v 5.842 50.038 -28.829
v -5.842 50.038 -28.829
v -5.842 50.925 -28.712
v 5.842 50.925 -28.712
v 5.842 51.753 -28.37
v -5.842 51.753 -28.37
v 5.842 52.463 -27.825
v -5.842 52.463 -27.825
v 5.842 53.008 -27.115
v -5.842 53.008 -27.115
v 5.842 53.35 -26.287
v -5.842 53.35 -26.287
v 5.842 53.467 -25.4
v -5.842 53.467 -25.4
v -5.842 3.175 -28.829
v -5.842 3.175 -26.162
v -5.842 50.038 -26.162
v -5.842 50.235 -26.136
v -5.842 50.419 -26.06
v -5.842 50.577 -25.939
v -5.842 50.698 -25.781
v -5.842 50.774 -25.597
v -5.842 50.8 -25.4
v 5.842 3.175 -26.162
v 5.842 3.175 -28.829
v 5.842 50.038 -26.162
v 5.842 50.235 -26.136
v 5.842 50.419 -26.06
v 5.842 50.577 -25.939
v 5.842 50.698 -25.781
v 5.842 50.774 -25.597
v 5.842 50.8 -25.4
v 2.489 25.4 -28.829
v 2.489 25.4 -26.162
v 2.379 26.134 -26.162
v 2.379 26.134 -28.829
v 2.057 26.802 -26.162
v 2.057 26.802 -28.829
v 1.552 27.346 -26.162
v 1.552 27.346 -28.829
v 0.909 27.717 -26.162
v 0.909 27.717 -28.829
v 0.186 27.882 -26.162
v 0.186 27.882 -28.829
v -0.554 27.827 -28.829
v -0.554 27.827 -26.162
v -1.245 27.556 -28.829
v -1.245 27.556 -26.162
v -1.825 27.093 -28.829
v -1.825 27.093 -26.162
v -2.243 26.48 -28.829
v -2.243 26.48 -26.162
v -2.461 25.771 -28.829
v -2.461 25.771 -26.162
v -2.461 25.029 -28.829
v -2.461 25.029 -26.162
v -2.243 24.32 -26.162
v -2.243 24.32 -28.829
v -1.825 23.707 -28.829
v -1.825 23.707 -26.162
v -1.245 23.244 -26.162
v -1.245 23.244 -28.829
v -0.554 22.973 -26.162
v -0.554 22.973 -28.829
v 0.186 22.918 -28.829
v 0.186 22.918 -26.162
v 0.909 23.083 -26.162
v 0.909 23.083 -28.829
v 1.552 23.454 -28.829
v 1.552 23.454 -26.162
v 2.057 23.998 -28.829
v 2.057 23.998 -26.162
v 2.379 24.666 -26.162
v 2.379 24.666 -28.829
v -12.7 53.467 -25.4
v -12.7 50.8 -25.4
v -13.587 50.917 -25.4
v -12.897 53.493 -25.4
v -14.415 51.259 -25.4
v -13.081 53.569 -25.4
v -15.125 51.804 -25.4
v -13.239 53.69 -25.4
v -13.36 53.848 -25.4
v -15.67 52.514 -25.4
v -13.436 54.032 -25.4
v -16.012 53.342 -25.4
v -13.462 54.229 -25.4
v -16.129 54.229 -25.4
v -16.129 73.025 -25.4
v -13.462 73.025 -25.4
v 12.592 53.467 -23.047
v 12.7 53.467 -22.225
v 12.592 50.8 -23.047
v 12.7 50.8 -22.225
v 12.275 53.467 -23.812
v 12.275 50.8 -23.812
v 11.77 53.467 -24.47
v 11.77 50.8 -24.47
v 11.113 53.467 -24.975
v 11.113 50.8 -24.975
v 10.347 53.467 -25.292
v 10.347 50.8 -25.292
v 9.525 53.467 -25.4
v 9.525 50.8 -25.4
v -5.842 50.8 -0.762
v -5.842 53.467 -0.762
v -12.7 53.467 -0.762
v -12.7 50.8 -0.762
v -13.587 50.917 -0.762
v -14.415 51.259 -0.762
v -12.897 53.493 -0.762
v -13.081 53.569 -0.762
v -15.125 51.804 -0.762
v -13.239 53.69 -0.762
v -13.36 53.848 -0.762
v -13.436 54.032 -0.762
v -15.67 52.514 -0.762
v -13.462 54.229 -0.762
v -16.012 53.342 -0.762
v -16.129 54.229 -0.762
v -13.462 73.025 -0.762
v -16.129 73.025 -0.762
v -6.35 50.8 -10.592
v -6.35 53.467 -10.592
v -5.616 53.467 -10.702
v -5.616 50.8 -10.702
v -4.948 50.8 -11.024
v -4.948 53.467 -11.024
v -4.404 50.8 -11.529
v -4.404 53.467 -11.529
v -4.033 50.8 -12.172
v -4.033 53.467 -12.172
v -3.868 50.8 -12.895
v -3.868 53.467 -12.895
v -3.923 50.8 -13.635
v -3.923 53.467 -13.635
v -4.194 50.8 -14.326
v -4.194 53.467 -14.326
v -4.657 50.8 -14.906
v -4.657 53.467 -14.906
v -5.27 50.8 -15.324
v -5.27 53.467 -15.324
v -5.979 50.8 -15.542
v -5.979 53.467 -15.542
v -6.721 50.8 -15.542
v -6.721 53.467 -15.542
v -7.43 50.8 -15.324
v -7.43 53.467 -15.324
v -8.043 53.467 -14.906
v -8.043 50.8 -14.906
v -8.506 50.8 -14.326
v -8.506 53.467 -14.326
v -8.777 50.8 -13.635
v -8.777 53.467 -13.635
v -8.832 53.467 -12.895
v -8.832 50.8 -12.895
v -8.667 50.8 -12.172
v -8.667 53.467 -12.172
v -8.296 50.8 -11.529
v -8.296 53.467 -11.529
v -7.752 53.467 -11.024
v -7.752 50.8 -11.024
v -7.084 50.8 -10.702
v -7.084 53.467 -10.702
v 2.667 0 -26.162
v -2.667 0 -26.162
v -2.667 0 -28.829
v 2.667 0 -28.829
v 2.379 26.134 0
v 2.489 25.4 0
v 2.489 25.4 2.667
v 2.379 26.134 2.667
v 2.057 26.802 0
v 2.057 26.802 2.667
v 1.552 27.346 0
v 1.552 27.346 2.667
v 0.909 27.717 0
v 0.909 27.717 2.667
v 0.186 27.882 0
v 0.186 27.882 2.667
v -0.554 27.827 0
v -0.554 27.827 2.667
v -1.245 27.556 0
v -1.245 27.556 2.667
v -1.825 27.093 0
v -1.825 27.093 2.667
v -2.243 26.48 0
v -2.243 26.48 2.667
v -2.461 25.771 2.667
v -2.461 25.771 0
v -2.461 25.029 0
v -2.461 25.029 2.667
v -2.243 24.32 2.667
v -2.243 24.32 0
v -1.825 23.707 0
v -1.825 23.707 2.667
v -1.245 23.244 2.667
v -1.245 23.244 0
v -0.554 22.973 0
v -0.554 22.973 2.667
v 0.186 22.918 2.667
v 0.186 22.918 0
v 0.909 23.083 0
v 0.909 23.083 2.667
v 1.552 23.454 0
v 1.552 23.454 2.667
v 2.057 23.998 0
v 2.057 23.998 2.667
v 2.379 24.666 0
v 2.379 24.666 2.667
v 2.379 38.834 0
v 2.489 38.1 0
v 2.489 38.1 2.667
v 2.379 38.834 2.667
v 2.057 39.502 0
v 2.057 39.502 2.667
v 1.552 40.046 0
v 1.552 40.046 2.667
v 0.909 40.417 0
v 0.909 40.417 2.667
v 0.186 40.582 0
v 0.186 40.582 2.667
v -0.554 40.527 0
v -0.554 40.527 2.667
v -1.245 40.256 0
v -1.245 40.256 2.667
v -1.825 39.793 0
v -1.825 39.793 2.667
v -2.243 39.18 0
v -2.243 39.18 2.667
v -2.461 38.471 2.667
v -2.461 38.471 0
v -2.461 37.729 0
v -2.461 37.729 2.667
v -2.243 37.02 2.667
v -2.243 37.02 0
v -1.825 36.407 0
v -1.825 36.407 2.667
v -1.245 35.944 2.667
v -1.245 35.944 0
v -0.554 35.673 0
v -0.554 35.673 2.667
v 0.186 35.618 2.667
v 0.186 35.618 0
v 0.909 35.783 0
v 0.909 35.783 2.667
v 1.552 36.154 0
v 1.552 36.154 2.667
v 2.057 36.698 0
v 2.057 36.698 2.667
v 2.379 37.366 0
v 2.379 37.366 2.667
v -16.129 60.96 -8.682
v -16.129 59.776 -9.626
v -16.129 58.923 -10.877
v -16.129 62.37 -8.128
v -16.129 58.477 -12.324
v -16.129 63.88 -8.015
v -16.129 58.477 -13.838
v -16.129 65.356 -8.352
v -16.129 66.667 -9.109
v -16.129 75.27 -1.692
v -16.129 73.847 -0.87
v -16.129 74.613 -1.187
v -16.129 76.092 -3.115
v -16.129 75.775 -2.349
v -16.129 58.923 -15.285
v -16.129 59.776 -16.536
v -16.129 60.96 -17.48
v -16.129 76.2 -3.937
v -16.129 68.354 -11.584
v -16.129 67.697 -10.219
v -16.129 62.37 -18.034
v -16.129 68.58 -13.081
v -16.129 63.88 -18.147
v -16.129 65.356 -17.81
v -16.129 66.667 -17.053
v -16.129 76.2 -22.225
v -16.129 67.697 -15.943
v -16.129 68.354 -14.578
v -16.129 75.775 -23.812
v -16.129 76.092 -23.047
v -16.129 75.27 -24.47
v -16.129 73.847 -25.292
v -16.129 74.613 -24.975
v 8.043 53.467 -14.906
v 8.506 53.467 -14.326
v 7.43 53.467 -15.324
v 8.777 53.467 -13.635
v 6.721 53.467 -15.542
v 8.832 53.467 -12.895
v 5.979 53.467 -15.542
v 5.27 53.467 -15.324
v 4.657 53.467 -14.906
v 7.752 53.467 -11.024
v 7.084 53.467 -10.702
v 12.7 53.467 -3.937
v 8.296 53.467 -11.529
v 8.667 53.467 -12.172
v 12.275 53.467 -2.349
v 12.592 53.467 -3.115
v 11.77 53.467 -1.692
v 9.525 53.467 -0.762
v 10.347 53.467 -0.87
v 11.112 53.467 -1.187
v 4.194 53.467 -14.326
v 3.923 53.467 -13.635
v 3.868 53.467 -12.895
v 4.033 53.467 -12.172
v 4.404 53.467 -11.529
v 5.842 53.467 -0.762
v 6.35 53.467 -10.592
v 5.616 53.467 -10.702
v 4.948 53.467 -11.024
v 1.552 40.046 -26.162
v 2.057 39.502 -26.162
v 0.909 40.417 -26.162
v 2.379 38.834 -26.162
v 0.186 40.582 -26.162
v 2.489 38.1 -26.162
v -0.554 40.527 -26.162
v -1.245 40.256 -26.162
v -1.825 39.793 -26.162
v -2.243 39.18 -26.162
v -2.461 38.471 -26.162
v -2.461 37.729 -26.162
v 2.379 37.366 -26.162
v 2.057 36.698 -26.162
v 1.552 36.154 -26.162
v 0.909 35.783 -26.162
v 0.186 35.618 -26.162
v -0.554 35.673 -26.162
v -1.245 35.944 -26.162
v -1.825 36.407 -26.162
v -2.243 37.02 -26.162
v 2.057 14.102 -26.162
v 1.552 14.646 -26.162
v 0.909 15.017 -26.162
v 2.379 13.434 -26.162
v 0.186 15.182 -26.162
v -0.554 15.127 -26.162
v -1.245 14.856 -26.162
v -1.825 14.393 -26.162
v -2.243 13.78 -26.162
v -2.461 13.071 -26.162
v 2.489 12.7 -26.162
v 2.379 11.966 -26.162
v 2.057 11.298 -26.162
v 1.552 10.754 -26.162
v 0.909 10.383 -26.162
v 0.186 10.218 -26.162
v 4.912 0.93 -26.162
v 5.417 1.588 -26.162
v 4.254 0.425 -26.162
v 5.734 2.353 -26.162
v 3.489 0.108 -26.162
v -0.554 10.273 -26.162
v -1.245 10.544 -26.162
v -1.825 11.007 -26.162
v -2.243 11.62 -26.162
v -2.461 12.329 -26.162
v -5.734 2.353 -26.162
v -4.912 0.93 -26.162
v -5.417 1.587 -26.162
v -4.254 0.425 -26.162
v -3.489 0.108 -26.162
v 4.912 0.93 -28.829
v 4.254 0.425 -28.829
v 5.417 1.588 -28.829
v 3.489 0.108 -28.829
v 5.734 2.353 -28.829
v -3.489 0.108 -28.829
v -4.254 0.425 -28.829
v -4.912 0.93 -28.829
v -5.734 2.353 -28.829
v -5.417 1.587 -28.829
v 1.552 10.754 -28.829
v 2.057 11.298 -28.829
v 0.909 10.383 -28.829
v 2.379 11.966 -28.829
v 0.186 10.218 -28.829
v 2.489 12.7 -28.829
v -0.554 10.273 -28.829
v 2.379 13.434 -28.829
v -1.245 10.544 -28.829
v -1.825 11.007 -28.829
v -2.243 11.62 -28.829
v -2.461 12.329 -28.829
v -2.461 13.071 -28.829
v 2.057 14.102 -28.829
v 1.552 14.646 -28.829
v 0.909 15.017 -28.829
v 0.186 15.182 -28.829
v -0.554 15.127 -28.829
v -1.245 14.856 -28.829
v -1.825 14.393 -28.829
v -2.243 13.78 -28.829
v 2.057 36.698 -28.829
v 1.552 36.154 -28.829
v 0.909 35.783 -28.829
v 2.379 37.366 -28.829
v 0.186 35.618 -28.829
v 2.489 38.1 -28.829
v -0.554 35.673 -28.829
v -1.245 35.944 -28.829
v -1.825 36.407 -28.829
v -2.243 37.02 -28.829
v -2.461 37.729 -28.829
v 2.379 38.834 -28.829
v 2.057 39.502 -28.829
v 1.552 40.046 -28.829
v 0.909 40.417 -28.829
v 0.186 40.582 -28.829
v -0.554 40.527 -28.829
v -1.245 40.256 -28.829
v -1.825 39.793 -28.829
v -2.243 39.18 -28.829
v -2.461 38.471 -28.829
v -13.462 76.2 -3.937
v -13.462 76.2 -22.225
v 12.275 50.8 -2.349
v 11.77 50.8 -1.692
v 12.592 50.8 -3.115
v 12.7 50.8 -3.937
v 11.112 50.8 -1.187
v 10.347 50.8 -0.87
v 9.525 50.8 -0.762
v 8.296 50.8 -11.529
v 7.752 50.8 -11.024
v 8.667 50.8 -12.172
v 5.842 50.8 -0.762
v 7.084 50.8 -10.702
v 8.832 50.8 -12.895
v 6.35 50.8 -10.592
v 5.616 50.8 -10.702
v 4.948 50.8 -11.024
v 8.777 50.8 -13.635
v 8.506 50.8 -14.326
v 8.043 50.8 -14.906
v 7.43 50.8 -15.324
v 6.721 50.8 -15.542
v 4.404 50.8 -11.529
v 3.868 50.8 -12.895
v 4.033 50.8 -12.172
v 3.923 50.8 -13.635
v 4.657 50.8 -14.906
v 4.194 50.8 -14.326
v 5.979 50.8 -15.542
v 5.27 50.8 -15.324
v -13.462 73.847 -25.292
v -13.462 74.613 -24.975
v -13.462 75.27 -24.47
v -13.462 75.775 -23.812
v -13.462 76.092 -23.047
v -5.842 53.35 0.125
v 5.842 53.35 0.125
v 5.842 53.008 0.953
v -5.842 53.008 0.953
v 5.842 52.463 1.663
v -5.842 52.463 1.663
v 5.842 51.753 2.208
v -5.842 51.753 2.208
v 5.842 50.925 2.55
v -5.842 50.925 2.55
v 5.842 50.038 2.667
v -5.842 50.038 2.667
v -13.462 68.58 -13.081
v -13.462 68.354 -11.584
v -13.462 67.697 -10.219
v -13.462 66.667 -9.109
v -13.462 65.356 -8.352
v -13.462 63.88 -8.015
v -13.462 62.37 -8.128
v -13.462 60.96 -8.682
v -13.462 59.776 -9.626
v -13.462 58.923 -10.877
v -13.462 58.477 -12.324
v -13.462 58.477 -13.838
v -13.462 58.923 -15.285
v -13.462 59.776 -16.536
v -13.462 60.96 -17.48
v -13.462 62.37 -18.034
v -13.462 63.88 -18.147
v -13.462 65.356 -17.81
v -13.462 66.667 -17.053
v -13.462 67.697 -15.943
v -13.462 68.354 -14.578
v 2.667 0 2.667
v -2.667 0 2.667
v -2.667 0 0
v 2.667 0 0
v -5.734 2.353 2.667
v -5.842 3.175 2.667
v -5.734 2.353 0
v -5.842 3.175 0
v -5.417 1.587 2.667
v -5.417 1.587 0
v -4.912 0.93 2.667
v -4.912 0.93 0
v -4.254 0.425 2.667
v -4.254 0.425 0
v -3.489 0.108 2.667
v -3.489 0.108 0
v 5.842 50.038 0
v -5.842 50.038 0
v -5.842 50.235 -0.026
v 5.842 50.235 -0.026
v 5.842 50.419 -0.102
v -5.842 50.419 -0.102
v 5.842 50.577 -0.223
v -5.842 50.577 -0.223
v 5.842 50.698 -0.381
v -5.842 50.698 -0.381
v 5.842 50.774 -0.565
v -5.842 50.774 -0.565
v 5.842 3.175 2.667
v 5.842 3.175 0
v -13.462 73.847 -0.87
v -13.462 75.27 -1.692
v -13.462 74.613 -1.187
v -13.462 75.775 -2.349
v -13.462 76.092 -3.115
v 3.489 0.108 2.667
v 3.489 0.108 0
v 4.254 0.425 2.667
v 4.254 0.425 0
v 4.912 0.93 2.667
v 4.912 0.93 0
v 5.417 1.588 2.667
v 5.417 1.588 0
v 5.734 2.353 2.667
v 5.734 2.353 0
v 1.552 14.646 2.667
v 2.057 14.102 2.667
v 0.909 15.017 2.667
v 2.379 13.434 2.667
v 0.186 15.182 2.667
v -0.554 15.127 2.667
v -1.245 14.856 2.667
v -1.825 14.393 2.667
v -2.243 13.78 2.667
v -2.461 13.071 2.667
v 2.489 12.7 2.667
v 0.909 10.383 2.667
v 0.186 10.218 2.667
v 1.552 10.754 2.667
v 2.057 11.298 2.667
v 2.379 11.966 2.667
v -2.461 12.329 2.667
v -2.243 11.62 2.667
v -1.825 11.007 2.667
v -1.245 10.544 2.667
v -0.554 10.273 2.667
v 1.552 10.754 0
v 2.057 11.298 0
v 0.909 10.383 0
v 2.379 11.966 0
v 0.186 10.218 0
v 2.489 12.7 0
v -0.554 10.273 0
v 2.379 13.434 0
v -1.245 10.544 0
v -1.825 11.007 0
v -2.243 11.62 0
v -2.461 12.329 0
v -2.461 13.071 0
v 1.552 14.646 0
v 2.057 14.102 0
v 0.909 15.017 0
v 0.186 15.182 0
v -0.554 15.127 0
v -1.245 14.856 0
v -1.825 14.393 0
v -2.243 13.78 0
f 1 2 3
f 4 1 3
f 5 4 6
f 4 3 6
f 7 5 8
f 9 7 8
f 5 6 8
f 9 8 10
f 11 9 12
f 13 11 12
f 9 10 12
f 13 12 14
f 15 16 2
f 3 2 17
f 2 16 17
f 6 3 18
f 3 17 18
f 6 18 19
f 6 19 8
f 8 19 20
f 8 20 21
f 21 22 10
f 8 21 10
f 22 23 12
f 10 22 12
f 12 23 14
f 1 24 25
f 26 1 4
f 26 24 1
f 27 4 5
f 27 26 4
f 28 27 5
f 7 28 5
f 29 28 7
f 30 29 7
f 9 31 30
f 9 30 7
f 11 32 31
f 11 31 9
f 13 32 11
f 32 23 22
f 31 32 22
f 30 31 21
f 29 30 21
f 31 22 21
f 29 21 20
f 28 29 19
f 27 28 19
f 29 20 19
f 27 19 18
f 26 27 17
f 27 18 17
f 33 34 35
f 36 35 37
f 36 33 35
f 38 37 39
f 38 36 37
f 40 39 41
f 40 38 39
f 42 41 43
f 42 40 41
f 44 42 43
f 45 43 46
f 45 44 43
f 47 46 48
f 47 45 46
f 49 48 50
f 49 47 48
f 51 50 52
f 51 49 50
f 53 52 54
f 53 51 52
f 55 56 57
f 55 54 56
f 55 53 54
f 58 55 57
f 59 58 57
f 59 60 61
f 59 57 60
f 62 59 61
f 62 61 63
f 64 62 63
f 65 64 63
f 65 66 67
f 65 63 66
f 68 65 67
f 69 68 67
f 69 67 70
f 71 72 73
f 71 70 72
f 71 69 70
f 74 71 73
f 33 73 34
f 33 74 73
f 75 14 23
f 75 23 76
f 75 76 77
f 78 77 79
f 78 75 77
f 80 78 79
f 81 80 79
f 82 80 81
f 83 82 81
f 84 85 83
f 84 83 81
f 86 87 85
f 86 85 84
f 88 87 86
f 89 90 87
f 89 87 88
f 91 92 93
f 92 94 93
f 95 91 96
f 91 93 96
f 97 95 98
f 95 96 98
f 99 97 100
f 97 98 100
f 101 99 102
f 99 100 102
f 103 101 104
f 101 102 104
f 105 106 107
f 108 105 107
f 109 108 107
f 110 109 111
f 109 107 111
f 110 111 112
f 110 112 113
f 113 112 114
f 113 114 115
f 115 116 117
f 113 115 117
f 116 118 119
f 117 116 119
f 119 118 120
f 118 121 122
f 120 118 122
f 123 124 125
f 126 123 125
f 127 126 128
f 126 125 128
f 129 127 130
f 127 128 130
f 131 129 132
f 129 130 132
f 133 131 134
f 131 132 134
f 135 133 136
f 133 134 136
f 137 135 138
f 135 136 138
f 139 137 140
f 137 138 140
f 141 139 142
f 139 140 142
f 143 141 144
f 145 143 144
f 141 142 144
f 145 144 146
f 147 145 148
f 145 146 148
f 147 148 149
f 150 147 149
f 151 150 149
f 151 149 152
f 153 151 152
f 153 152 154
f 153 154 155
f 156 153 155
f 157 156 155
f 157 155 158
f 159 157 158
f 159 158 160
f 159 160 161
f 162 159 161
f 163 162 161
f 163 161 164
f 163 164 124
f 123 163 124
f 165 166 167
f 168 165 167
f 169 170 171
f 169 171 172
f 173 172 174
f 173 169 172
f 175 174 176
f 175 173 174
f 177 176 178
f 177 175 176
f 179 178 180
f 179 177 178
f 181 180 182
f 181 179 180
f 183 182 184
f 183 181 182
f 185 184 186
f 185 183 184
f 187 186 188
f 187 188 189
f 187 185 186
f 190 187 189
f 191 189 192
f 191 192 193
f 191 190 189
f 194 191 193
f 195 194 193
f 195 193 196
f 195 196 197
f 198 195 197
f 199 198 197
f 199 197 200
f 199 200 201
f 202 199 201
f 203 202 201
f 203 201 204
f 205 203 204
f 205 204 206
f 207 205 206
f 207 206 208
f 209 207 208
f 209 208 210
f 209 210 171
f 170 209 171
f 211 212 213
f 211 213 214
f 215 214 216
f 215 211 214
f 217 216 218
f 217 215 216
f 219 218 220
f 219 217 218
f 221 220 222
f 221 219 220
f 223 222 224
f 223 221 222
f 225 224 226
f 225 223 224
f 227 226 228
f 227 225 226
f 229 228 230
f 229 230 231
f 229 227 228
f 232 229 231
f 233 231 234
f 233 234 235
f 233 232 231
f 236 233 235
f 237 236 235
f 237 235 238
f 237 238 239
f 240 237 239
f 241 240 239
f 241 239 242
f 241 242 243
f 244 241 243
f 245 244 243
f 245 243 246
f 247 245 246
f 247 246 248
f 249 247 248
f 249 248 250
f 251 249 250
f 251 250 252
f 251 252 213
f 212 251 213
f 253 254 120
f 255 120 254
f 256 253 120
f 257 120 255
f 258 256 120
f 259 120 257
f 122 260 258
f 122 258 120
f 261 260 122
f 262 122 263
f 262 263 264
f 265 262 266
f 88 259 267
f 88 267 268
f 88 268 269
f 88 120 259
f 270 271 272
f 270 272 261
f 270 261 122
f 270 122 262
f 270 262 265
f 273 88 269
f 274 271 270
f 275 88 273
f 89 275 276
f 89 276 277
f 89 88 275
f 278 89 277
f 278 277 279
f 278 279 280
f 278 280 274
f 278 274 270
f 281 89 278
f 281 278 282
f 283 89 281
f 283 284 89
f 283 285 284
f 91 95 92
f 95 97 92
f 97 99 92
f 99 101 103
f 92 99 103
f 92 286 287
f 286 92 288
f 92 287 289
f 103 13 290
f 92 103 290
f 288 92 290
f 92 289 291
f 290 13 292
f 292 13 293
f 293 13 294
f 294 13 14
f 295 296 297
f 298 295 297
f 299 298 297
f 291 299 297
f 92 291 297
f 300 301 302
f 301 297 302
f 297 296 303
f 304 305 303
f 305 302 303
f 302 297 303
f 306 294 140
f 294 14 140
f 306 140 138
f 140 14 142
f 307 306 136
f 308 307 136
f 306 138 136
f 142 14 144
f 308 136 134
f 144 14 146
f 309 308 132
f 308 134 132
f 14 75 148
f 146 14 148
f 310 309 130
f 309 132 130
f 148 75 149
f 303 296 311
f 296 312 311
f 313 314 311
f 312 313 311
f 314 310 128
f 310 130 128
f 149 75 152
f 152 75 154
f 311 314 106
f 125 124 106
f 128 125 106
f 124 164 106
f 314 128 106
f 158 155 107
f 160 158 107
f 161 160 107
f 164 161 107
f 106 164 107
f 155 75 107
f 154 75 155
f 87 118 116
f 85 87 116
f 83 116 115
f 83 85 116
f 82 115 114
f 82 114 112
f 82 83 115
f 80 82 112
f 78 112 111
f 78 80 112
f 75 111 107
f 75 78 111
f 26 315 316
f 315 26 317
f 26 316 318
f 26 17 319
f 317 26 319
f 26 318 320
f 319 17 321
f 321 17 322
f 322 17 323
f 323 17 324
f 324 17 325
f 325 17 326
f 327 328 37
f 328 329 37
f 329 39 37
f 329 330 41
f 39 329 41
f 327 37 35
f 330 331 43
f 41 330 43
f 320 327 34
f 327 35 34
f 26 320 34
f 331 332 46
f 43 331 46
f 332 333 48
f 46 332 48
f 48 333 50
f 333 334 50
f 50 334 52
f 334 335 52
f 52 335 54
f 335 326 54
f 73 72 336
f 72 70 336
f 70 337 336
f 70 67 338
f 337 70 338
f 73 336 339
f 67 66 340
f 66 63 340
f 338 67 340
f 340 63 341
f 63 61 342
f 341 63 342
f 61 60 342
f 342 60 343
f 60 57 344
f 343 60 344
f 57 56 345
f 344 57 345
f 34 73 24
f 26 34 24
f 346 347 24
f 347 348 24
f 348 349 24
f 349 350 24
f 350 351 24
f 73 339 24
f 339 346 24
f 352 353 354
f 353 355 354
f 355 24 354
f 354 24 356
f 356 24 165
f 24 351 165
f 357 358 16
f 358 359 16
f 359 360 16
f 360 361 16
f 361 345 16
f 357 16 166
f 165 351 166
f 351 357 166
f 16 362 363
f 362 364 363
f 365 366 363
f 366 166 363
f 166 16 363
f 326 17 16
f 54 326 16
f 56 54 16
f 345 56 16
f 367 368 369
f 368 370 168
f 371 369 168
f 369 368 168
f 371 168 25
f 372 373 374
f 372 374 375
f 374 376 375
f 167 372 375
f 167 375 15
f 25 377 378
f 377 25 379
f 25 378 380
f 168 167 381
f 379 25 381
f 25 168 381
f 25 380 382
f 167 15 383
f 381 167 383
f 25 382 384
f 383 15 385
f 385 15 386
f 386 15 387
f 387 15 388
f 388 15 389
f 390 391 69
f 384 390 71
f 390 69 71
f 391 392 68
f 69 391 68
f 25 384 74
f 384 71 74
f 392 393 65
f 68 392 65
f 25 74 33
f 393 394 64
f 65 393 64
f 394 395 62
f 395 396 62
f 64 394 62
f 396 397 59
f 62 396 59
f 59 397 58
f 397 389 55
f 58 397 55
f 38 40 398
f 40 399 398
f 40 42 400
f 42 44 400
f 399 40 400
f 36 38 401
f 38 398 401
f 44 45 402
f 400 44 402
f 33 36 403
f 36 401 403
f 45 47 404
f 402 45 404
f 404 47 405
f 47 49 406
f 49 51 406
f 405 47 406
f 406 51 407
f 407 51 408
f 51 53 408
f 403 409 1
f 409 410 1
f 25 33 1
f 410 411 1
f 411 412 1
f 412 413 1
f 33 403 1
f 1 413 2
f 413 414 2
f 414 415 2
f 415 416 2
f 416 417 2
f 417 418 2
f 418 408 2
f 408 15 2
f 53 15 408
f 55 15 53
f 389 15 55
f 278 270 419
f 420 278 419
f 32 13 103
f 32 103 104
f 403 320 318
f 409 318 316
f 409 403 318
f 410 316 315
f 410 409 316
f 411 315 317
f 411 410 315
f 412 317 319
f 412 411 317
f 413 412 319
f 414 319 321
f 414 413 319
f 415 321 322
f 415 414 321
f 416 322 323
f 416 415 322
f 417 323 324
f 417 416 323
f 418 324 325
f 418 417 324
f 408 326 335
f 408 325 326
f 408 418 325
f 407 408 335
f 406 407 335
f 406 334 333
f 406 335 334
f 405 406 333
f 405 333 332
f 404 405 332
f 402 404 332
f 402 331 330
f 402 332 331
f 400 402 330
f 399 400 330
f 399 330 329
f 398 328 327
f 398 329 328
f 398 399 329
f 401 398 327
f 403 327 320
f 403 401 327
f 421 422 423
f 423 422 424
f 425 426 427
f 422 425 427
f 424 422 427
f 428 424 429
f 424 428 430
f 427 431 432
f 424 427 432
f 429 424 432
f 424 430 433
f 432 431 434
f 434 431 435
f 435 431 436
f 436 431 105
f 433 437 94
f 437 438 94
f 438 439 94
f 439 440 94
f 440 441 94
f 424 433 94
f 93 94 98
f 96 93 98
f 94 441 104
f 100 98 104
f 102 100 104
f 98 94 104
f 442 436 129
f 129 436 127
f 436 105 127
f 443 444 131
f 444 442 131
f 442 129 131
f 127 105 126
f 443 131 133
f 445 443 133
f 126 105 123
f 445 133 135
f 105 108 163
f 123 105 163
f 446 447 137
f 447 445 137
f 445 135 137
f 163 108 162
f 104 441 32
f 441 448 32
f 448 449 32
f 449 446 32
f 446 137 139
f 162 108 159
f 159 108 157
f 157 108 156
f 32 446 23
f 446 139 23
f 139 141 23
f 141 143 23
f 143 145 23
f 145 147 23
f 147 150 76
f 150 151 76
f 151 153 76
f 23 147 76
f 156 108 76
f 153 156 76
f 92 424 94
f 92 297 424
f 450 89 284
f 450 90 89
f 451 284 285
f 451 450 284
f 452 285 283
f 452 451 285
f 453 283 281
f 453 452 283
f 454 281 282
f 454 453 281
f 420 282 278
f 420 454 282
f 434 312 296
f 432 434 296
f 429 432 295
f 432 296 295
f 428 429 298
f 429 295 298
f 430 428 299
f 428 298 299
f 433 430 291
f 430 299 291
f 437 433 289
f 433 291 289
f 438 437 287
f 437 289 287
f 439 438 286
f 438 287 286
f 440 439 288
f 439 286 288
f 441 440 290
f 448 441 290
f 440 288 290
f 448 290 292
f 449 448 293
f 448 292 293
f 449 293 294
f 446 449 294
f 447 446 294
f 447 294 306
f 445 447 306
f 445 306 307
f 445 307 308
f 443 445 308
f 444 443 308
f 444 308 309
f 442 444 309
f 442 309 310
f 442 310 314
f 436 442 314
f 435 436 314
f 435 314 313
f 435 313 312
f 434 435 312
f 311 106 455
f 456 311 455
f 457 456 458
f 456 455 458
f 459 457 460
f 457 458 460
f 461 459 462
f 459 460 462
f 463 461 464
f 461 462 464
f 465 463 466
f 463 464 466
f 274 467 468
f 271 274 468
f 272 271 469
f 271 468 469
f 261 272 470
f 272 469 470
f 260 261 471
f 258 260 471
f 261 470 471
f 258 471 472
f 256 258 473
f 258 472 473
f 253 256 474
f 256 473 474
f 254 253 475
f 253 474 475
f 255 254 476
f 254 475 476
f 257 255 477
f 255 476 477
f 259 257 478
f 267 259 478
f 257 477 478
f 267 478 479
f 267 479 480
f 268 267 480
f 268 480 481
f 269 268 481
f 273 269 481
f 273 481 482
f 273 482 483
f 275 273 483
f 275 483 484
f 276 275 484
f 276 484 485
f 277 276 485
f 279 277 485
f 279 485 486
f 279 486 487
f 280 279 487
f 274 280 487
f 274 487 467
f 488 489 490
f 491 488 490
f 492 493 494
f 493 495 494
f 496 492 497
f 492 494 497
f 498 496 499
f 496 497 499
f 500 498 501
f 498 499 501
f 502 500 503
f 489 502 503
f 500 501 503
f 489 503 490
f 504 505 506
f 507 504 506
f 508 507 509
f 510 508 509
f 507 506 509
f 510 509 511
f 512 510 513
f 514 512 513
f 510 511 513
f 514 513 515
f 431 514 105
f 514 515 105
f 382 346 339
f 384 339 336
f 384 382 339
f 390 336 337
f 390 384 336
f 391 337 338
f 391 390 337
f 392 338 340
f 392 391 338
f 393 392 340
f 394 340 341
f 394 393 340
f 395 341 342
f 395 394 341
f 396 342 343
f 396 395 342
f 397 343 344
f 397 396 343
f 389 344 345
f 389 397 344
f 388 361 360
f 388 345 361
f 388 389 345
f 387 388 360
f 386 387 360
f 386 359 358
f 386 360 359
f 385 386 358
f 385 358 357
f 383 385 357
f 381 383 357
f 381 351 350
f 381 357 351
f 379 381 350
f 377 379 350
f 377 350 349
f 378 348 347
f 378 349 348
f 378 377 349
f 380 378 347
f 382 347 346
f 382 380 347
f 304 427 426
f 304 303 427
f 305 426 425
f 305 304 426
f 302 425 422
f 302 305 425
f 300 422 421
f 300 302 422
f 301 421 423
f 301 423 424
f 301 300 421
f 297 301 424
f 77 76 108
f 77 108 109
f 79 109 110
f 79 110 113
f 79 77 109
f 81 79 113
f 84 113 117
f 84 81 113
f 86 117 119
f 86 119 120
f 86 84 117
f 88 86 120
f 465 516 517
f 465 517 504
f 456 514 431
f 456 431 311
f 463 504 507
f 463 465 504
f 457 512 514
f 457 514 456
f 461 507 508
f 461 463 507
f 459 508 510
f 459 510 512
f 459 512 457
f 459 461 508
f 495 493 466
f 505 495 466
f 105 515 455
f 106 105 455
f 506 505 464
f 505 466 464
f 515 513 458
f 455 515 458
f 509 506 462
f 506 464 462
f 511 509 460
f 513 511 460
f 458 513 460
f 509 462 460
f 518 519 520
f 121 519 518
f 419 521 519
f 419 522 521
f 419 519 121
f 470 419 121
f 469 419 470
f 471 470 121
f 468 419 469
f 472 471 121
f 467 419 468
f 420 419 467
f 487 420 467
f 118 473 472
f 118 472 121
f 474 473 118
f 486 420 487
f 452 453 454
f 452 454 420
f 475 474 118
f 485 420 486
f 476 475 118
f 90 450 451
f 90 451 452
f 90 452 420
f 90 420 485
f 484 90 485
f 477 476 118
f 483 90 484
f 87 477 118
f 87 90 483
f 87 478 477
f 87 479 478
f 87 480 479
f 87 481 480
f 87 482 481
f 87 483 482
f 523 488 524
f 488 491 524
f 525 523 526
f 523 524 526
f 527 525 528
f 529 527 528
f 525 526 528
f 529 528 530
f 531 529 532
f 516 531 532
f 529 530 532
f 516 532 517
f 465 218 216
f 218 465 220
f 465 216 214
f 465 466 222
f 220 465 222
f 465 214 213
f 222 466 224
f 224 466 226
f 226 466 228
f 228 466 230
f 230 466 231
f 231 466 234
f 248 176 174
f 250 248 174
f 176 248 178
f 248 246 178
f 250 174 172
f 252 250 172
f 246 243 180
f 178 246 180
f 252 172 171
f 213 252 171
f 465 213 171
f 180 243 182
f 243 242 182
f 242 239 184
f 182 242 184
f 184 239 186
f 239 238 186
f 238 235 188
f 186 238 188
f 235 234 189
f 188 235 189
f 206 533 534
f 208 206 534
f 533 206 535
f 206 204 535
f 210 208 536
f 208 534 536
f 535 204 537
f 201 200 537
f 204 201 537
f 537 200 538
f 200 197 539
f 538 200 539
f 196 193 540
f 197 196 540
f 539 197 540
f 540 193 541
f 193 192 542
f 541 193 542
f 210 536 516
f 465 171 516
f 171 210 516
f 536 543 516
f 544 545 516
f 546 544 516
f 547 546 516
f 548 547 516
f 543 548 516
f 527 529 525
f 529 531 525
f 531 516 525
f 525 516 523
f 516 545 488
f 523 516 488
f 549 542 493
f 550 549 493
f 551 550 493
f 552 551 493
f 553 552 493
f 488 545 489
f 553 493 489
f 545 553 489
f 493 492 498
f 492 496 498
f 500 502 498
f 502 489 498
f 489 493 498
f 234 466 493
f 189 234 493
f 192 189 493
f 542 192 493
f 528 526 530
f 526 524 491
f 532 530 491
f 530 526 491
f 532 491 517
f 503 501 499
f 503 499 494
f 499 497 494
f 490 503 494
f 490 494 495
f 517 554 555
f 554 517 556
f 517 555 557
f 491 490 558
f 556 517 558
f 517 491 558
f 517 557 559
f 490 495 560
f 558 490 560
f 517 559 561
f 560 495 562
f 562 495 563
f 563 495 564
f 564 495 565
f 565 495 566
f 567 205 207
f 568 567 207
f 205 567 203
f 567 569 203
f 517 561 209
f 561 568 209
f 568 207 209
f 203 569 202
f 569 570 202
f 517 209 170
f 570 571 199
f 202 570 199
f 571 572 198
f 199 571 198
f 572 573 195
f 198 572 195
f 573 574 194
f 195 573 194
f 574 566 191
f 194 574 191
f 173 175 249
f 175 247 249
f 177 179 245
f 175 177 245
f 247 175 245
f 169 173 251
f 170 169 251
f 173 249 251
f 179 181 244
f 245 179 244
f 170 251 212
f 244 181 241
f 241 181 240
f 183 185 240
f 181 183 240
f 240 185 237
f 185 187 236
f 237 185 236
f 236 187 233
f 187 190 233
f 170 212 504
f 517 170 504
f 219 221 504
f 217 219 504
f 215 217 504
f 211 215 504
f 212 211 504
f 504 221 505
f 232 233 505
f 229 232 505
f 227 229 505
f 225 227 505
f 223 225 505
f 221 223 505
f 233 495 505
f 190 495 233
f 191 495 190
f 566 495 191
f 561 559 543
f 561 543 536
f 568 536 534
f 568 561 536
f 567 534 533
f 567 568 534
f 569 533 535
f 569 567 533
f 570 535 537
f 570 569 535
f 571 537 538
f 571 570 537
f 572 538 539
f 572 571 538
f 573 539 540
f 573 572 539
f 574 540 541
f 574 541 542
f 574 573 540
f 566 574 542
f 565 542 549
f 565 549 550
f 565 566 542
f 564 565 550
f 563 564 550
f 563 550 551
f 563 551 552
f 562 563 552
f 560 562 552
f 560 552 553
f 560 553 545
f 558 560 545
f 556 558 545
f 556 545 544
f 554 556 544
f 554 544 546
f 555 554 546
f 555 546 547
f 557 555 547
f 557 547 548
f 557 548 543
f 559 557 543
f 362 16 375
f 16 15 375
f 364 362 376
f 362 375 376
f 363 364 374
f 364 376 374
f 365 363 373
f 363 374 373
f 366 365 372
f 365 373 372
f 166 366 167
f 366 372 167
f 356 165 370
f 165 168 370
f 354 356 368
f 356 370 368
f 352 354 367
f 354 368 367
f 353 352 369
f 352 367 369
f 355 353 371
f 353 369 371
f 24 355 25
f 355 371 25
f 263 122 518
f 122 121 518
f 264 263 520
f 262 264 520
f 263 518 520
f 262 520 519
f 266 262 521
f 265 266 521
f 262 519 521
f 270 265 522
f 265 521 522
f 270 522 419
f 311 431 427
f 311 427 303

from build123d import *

# Parameters (mm, degrees)
BASE_FLANGE1_START       = -12.7
BASE_FLANGE1_DEPTH       = 25.4
EDGE_FLANGE1_DEPTH       = 24.638
SKETCH9_R                = 5.08
CUT_EXTRUDE1_DEPTH       = 86.568694538
CUT_EXTRUDE2_START       = -12.7
CUT_EXTRUDE2_DEPTH       = 6.858
CUT_EXTRUDE2_START_2     = 5.842
CUT_EXTRUDE2_2_DEPTH     = 6.858
CUT_EXTRUDE2_START_3     = -28.829
CUT_EXTRUDE2_3_OUTLINE_R = 2.4892
CUT_EXTRUDE2_3_DEPTH     = 31.496
CUT_EXTRUDE3_REACH       = 64.849
SKETCH11_R               = 2.4892
FILLET1_R                = 3.175


with BuildPart() as part:
    # Base-Flange1: read off the stored shape, not the designer's step
    # Base-Flange1 outline → Base-Flange1 (new body)
    with BuildSketch(Plane(origin=(0, 0, 0), x_dir=(0, 0, -1), z_dir=(1, 0, 0)).offset(BASE_FLANGE1_START)):
        with BuildLine():
            Line((26.162, 50.038), (26.162, 0))
            Line((26.162, 0), (28.829, 0))
            Line((28.829, 0), (28.829, 50.038))
            ThreePointArc((28.829, 50.038), (27.824669153, 52.462669153), (25.4, 53.467))
            Line((25.4, 53.467), (0.762, 53.467))
            ThreePointArc((0.762, 53.467), (-1.662669153, 52.462669153), (-2.667, 50.038))
            Line((-2.667, 50.038), (-2.667, 0))
            Line((-2.667, 0), (0, 0))
            Line((0, 0), (0, 50.038))
            ThreePointArc((0, 50.038), (0.223184633, 50.576815367), (0.762, 50.8))
            Line((0.762, 50.8), (25.4, 50.8))
            ThreePointArc((25.4, 50.8), (25.938815367, 50.576815367), (26.162, 50.038))
        make_face()
    extrude(amount=BASE_FLANGE1_DEPTH)

    # Edge-Flange1: sheet metal written as solids
    # Edge-Flange1 section (on a plane across the edge) → Edge-Flange1 (add)
    with BuildSketch(Plane(origin=(-13.462, 53.467, -25.4), x_dir=(1, 0, 0), z_dir=(0, 0, 1))):
        with BuildLine():
            Line((-2.667, 0.762), (-2.667, 22.733))
            Line((-2.667, 22.733), (0, 22.733))
            Line((0, 22.733), (0, 0.762))
            ThreePointArc((0, 0.762), (0.223184633, 0.223184633), (0.762, 0))
            Line((0.762, 0), (0.762, -2.667))
            ThreePointArc((0.762, -2.667), (-1.662669153, -1.662669153), (-2.667, 0.762))
        make_face()
    extrude(amount=EDGE_FLANGE1_DEPTH)

    # Sketch9 → Cut-Extrude1 (cut, through all)
    with BuildSketch(Plane(origin=(-13.462, 0, 0), x_dir=(0, 0, -1), z_dir=(1, 0, 0))):
        with Locations(Location((13.081, 63.5, 0), (0, 0, 90))):
            Circle(SKETCH9_R)
    extrude(amount=-CUT_EXTRUDE1_DEPTH, mode=Mode.SUBTRACT)

    # Cut-Extrude2: read off the stored shape, not the designer's step
    # Cut-Extrude2 outline → Cut-Extrude2 (cut)
    with BuildSketch(Plane.YZ.offset(CUT_EXTRUDE2_START)):
        with BuildLine():
            Line((53.467, -25.4), (50.8, -25.4))
            ThreePointArc((50.8, -25.4), (50.576815367, -25.938815367), (50.038, -26.162))
            Line((50.038, -26.162), (0, -26.162))
            Line((0, -26.162), (0, -28.829))
            Line((0, -28.829), (50.038, -28.829))
            ThreePointArc((50.038, -28.829), (52.462669153, -27.824669153), (53.467, -25.4))
        make_face()
        with BuildLine():
            ThreePointArc((50.038, 0), (50.576815367, -0.223184633), (50.8, -0.762))
            Line((50.8, -0.762), (53.467, -0.762))
            ThreePointArc((53.467, -0.762), (52.462669153, 1.662669153), (50.038, 2.667))
            Line((50.038, 2.667), (0, 2.667))
            Line((0, 2.667), (0, 0))
            Line((0, 0), (50.038, 0))
        make_face()
    extrude(amount=CUT_EXTRUDE2_DEPTH, mode=Mode.SUBTRACT)

    # Cut-Extrude2 2 outline → Cut-Extrude2 2 (cut)
    with BuildSketch(Plane.YZ.offset(CUT_EXTRUDE2_START_2)):
        with BuildLine():
            Line((53.467, -25.4), (50.8, -25.4))
            ThreePointArc((50.8, -25.4), (50.576815367, -25.938815367), (50.038, -26.162))
            Line((50.038, -26.162), (0, -26.162))
            Line((0, -26.162), (0, -28.829))
            Line((0, -28.829), (50.038, -28.829))
            ThreePointArc((50.038, -28.829), (52.462669153, -27.824669153), (53.467, -25.4))
        make_face()
        with BuildLine():
            ThreePointArc((50.038, 0), (50.576815367, -0.223184633), (50.8, -0.762))
            Line((50.8, -0.762), (53.467, -0.762))
            ThreePointArc((53.467, -0.762), (52.462669153, 1.662669153), (50.038, 2.667))
            Line((50.038, 2.667), (0, 2.667))
            Line((0, 2.667), (0, 0))
            Line((0, 0), (50.038, 0))
        make_face()
    extrude(amount=CUT_EXTRUDE2_2_DEPTH, mode=Mode.SUBTRACT)

    # Cut-Extrude2 3 outline → Cut-Extrude2 3 (cut)
    with BuildSketch(Plane.XY.offset(CUT_EXTRUDE2_START_3)):
        with Locations((0, 12.7)):
            Circle(CUT_EXTRUDE2_3_OUTLINE_R)
        with Locations((0, 38.1)):
            Circle(CUT_EXTRUDE2_3_OUTLINE_R)
        with Locations((0, 25.4)):
            Circle(CUT_EXTRUDE2_3_OUTLINE_R)
    extrude(amount=CUT_EXTRUDE2_3_DEPTH, mode=Mode.SUBTRACT)

    # Sketch11 → Cut-Extrude3 (cut, up to next)
    with BuildSketch(Plane(origin=(0, 53.467, 0), x_dir=(1, 0, 0), z_dir=(0, 1, 0)), mode=Mode.PRIVATE) as cut_extrude3_sk1:
        with Locations(Location((-6.35, 13.081, 0), (0, 0, 270))):
            Circle(SKETCH11_R)
    cut_extrude3_tool1 = extrude(cut_extrude3_sk1.sketch, amount=-CUT_EXTRUDE3_REACH, mode=Mode.PRIVATE) & part.part
    # Sketch11 → Cut-Extrude3 (cut, up to next)
    with BuildSketch(Plane(origin=(0, 53.467, 0), x_dir=(1, 0, 0), z_dir=(0, 1, 0)), mode=Mode.PRIVATE) as cut_extrude3_sk2:
        with Locations(Location((6.35, 13.081, 0), (0, 0, 270))):
            Circle(SKETCH11_R)
    cut_extrude3_tool2 = extrude(cut_extrude3_sk2.sketch, amount=-CUT_EXTRUDE3_REACH, mode=Mode.PRIVATE) & part.part
    add(cut_extrude3_tool1.solids().sort_by_distance((-6.35, 53.467, -13.081))[0], mode=Mode.SUBTRACT)
    add(cut_extrude3_tool2.solids().sort_by_distance((6.35, 53.467, -13.081))[0], mode=Mode.SUBTRACT)

    # Fillet1
    fillet1_edges = [part.edges().sort_by_distance(p)[0] for p in [
        (5.842, 0, 1.3335),
        (-5.842, 0, 1.3335),
        (5.842, 0, -27.4955),
        (-5.842, 0, -27.4955),
        (12.7, 52.1335, -25.4),
        (12.7, 52.1335, -0.762),
        (-14.7955, 76.2, -25.4),
        (-14.7955, 76.2, -0.762),
    ]]
    fillet(fillet1_edges, radius=FILLET1_R)


solid = part.part
